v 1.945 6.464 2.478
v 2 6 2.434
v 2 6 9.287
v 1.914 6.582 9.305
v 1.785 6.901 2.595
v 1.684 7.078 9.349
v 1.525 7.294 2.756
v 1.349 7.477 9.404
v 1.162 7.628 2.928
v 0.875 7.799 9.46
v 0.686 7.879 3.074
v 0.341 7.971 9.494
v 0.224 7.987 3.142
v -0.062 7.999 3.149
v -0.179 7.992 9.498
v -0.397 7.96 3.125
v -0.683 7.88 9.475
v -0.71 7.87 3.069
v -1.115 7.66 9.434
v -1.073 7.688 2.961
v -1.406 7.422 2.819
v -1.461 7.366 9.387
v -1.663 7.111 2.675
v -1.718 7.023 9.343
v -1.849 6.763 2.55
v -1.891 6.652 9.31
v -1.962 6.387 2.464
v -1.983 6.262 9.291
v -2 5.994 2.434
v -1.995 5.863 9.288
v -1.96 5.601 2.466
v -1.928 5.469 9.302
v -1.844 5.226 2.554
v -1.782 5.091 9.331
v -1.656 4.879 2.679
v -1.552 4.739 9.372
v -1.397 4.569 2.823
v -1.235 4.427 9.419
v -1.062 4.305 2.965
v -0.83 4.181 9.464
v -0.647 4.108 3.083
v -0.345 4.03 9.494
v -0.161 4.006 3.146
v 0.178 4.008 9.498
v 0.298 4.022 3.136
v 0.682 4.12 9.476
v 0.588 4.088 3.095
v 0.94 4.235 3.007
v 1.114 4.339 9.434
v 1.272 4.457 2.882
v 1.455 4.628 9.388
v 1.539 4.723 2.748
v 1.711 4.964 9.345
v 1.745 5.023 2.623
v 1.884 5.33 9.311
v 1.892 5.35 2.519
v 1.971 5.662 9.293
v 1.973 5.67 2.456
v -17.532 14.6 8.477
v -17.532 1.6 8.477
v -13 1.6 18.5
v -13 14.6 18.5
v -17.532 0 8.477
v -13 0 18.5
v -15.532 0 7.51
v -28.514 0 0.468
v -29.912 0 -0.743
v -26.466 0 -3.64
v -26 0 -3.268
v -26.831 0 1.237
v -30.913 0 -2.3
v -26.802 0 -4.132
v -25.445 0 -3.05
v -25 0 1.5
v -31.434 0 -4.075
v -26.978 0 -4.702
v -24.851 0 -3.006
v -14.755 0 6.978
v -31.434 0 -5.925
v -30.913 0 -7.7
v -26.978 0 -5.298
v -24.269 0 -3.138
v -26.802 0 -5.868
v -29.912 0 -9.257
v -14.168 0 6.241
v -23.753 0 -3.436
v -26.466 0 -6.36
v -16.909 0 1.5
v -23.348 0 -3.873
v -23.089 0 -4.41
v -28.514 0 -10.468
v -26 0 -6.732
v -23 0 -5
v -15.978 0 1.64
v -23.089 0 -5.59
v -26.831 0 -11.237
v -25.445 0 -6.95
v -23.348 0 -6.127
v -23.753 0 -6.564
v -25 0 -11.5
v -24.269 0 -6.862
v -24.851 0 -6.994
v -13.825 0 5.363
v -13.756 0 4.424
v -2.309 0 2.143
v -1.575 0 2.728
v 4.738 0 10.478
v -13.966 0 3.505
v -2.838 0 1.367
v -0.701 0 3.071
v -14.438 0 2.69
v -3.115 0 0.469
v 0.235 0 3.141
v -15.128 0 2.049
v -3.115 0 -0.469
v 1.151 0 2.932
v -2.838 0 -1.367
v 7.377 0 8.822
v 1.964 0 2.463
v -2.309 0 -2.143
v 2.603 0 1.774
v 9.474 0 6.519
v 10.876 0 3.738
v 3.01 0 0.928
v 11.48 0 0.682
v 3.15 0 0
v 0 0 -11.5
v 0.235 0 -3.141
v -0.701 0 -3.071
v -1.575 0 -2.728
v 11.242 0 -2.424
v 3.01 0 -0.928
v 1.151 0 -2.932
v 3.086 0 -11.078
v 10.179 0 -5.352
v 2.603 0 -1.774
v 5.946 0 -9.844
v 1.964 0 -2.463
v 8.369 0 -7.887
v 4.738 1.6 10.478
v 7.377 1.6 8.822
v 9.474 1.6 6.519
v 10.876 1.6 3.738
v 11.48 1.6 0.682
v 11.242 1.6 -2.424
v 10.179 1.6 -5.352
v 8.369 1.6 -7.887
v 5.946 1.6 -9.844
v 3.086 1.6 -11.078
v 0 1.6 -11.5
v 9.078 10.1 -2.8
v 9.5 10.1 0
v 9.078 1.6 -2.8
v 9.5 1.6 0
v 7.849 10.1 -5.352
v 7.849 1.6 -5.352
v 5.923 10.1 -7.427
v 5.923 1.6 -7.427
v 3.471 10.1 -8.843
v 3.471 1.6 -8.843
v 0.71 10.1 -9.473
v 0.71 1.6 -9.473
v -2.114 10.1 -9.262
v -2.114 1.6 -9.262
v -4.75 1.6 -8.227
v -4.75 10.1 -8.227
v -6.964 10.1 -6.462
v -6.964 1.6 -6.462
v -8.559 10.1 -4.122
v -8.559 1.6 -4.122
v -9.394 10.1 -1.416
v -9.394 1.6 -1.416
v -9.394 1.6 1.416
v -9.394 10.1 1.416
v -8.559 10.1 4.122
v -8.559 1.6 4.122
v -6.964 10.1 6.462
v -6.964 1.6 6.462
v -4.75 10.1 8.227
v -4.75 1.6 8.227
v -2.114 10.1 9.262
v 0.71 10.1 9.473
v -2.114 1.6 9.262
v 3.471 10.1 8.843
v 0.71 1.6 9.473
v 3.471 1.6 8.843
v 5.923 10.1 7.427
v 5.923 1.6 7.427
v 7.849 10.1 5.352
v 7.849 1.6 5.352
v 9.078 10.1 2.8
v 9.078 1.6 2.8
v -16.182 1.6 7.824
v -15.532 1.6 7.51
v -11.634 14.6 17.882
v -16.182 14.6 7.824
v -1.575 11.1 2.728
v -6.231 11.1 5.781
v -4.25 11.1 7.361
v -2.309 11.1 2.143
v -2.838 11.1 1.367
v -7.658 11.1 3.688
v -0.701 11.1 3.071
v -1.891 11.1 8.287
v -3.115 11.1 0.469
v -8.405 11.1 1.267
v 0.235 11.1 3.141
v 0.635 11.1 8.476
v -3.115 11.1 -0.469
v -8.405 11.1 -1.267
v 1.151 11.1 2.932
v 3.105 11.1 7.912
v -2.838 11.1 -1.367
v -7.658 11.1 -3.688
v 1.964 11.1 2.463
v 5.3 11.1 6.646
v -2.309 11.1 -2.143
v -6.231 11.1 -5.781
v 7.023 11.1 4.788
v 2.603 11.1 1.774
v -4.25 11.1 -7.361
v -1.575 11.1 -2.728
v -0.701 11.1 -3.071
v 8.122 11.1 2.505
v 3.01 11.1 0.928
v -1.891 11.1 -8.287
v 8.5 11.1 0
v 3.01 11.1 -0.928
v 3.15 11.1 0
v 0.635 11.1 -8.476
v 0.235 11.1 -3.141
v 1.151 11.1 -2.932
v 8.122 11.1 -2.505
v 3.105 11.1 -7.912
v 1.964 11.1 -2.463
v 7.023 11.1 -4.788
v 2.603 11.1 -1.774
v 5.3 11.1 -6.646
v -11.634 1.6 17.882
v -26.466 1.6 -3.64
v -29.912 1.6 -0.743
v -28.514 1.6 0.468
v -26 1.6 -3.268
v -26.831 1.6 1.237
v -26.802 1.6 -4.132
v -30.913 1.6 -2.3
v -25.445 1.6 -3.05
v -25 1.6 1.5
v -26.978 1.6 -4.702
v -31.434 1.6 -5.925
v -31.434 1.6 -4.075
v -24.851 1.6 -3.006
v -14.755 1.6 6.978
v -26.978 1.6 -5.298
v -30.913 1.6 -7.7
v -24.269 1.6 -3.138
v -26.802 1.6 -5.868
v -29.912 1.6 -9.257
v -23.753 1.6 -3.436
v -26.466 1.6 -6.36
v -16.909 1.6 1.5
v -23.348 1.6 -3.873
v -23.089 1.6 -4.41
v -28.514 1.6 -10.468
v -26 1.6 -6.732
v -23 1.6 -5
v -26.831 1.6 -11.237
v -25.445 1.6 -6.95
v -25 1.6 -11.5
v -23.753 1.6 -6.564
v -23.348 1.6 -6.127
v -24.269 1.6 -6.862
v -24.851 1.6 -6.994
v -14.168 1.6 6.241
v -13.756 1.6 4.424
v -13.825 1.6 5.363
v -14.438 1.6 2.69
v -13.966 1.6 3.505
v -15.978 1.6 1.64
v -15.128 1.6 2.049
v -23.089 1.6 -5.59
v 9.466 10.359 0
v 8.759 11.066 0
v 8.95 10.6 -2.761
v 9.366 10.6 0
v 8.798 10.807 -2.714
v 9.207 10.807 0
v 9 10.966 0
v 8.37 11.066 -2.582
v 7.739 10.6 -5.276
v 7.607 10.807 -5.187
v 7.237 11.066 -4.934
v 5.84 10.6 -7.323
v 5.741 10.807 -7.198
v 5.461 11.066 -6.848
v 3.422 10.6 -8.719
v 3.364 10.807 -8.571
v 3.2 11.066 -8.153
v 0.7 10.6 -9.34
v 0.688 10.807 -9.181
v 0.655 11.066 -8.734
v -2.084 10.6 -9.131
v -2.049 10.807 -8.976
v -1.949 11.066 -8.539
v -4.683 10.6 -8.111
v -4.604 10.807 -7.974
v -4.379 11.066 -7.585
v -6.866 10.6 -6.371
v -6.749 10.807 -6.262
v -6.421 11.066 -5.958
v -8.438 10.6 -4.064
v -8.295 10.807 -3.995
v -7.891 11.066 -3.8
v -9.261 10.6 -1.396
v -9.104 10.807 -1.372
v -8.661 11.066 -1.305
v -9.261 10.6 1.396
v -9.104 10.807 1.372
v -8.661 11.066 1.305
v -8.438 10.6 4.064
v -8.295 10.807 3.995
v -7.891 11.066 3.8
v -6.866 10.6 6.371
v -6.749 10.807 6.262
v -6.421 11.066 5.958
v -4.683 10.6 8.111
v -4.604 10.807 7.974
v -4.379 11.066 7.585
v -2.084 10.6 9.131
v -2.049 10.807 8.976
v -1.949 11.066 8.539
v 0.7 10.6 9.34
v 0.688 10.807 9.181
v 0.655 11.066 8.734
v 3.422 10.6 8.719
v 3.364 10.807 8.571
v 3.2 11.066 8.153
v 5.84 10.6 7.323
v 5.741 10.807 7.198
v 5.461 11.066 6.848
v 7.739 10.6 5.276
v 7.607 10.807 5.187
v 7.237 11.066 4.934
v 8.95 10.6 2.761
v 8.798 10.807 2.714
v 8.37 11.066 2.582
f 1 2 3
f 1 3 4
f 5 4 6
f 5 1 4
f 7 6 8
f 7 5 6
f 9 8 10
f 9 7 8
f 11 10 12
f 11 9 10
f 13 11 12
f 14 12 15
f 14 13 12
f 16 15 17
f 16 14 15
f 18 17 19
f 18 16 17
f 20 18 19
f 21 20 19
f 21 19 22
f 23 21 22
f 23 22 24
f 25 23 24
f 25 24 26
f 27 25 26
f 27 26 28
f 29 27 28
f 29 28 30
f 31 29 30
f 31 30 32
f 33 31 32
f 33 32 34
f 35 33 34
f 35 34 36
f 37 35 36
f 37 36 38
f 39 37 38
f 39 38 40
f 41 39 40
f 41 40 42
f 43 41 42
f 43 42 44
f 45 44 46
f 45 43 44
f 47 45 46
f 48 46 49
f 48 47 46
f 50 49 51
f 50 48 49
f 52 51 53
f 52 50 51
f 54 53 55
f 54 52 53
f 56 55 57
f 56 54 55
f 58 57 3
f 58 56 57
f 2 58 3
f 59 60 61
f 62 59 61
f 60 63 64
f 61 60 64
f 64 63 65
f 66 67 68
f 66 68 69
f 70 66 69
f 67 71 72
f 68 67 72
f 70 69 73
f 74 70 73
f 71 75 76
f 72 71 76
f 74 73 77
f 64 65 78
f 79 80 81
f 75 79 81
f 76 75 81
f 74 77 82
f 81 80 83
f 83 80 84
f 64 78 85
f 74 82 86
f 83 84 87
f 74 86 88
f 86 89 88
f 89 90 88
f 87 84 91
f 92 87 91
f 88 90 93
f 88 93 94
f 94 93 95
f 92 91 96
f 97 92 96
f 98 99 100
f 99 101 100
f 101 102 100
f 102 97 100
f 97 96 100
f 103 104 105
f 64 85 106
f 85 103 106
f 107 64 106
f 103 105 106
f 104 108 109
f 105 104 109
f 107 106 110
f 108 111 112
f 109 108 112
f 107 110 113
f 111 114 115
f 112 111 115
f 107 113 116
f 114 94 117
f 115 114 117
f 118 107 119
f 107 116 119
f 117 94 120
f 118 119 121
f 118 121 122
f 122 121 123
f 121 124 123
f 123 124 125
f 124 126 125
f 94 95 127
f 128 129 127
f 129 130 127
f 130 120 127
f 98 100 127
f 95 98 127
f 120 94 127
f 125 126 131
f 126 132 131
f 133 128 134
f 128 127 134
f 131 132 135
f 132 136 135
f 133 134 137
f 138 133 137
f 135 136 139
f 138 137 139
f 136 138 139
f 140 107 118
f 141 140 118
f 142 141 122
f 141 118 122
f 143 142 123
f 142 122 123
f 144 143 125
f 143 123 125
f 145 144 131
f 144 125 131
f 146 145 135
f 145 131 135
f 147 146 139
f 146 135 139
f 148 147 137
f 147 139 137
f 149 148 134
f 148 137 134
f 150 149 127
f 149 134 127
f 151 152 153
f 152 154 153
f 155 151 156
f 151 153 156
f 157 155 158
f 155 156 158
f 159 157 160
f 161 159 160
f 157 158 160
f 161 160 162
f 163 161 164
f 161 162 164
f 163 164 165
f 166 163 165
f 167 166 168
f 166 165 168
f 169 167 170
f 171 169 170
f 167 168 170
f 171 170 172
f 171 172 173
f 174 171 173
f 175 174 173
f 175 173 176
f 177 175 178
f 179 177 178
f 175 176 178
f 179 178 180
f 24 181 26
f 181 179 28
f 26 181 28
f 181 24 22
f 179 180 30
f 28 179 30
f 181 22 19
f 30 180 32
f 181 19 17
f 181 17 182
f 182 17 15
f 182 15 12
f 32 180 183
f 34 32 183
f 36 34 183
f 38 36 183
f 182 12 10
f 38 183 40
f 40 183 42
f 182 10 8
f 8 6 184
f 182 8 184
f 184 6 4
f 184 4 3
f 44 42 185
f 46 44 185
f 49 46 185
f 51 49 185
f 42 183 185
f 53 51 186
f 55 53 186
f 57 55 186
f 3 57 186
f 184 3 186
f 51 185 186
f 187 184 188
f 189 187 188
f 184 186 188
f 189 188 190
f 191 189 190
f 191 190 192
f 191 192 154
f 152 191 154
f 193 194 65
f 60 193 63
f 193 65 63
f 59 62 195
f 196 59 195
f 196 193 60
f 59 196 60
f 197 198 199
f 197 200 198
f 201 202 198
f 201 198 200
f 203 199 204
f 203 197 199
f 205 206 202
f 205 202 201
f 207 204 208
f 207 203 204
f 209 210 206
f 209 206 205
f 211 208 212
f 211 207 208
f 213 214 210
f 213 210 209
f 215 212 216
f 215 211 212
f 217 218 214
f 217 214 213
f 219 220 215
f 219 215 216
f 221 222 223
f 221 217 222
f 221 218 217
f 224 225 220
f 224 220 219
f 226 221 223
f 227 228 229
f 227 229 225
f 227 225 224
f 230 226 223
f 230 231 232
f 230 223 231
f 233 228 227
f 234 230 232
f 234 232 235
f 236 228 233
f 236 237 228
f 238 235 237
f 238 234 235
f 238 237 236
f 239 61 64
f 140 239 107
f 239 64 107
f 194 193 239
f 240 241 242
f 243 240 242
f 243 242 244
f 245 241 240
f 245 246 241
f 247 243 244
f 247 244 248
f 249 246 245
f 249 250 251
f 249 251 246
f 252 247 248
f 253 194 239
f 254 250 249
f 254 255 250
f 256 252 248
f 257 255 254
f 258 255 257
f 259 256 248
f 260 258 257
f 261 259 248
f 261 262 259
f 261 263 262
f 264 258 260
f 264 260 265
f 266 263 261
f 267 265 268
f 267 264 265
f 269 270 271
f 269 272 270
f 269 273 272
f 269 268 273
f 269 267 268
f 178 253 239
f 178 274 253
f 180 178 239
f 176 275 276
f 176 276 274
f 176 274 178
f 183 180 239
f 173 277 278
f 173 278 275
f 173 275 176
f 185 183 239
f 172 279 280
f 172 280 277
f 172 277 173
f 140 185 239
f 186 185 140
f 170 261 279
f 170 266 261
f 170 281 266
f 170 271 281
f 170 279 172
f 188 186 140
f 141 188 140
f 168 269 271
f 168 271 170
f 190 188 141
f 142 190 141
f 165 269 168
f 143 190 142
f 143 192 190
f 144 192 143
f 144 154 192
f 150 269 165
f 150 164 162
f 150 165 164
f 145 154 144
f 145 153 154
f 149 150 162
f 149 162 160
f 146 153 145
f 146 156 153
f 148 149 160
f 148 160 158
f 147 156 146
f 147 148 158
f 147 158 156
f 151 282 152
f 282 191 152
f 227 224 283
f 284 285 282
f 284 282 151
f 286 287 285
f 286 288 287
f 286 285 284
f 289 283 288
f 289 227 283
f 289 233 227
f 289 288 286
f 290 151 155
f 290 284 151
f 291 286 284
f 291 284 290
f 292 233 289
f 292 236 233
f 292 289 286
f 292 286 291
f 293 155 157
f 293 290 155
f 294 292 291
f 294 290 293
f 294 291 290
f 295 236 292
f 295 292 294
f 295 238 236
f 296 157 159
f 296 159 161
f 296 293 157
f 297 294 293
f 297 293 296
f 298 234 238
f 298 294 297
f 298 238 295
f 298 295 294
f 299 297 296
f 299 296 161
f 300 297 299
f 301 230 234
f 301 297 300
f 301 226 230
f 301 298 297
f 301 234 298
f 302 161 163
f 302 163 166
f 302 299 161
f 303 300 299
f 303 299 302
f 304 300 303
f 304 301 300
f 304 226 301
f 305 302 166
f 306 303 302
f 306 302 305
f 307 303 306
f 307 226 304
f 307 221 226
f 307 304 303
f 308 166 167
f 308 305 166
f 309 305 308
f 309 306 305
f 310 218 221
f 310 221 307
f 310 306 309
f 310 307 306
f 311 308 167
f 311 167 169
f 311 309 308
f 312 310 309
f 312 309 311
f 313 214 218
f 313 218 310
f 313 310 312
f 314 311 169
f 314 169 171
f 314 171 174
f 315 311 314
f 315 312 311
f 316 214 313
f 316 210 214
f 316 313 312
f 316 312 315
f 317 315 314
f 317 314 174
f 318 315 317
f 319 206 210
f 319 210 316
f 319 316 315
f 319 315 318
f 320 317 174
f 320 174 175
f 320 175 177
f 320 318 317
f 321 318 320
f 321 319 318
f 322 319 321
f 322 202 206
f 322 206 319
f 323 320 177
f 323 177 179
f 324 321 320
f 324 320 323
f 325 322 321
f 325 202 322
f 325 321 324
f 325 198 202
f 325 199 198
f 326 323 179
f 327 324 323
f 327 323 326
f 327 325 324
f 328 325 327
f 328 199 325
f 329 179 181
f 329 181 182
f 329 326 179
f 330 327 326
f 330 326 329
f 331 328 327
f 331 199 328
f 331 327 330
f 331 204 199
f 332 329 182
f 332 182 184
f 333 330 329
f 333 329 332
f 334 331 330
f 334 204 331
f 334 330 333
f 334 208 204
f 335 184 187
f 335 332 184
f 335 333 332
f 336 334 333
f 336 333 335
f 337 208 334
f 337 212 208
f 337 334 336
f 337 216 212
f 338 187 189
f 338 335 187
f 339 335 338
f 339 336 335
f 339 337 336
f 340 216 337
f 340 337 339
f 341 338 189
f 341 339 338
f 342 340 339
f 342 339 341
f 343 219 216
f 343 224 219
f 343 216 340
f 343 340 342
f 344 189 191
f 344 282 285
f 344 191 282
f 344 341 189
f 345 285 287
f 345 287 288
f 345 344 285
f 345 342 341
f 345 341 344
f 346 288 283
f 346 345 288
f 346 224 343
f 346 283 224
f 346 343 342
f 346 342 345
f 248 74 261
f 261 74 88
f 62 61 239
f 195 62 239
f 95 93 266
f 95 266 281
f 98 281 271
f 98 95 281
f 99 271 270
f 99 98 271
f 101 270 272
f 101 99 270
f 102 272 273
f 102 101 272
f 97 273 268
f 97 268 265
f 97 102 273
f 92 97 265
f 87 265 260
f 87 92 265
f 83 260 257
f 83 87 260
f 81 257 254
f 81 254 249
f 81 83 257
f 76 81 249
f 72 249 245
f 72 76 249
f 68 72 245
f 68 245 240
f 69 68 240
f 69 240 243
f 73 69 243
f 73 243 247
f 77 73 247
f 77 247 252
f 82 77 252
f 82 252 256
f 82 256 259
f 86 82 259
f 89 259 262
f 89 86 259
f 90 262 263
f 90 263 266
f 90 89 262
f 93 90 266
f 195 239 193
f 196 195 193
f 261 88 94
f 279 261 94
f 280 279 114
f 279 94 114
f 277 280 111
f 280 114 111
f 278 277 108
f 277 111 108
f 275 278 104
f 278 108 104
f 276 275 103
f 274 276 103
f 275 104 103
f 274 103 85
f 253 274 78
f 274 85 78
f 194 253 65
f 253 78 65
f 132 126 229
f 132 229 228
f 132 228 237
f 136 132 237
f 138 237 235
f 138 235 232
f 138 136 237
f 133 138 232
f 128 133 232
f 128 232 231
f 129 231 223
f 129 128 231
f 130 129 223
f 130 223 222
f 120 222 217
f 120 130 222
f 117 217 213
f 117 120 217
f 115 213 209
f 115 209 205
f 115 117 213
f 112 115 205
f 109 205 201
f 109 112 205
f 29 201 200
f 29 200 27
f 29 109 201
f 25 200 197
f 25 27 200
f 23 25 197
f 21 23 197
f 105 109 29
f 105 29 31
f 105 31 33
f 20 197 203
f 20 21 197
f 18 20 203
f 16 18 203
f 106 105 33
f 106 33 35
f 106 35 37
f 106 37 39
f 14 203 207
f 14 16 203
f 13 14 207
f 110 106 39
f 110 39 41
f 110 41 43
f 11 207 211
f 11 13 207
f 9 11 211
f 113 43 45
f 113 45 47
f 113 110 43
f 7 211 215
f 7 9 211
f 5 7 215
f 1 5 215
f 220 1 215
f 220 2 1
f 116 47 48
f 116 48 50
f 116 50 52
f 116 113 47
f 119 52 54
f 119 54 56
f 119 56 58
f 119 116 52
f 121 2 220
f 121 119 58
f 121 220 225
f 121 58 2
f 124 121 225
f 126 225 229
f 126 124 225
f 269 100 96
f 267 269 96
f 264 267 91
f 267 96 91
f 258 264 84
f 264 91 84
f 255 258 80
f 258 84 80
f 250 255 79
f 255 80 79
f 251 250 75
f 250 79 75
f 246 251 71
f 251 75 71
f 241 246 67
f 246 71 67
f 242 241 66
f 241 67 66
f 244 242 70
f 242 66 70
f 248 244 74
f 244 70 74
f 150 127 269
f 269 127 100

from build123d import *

# Parameters (mm, degrees)
ESQUISSE1_R             = 3.15
ESQUISSE1_R_2           = 2
BOSS_EXTRU_1_DEPTH      = 1.6
ESQUISSE2_R             = 9.5
ESQUISSE2_R_2           = 3.15
BOSS_EXTRU_2_DEPTH      = 9.5
CONG_1_R                = 1
BOSS_EXTRU_3_DEPTH      = 13
ESQUISSE4_R             = 2
ENL_V_MAT_EXTRU_1_DEPTH = 19.5


with BuildPart() as part:
    # Esquisse1 → Boss.-Extru.1 (new body)
    with BuildSketch(Plane(origin=(0, 0, 0), x_dir=(1, 0, 0), z_dir=(0, 1, 0))):
        with BuildLine():
            Line((0, 11.5), (-25, 11.5))
            ThreePointArc((-25, 11.5), (-31.5, 5), (-25, -1.5))
            Line((-25, -1.5), (-16.90921754, -1.5))
            ThreePointArc((-16.90921754, -1.5), (-13.826301978, -3.956560509), (-15.532463951, -7.510159982))
            Line((-15.532463951, -7.510159982), (-17.532463951, -8.477187494))
            Line((-17.532463951, -8.477187494), (-13, -18.5))
            Line((-13, -18.5), (4.73848504, -10.478394893))
            ThreePointArc((4.73848504, -10.478394893), (11.241697854, 2.423680954), (0, 11.5))
        make_face()
        Circle(ESQUISSE1_R, mode=Mode.SUBTRACT)
        with Locations((-25, 5)):
            Circle(ESQUISSE1_R_2, mode=Mode.SUBTRACT)
    extrude(amount=BOSS_EXTRU_1_DEPTH)

    # Esquisse2 → Boss.-Extru.2 (add)
    with BuildSketch(Plane(origin=(0, 1.6, 0), x_dir=(1, 0, 0), z_dir=(0, 1, 0))):
        Circle(ESQUISSE2_R)
        Circle(ESQUISSE2_R_2, mode=Mode.SUBTRACT)
    extrude(amount=BOSS_EXTRU_2_DEPTH)

    # Congé1
    cong_1_edges = [part.edges().sort_by_distance(p)[0] for p in [
        (-9.5, 11.1, 0),
    ]]
    fillet(cong_1_edges, radius=CONG_1_R)

    # Esquisse3 → Boss.-Extru.3 (add)
    with BuildSketch(Plane(origin=(0, 1.6, 0), x_dir=(1, 0, 0), z_dir=(0, 1, 0))):
        Polygon((-17.532463951, -8.477187494), (-13, -18.5), (-11.633703391, -17.88214048), (-16.182035998, -7.824237002), align=None)
    extrude(amount=BOSS_EXTRU_3_DEPTH)

    # Esquisse4 → Enlèv. mat.-Extru.1 (cut, through all)
    with BuildSketch(Plane.XY):
        with Locations((0, 6)):
            Circle(ESQUISSE4_R)
    extrude(amount=ENL_V_MAT_EXTRU_1_DEPTH, mode=Mode.SUBTRACT)


solid = part.part
